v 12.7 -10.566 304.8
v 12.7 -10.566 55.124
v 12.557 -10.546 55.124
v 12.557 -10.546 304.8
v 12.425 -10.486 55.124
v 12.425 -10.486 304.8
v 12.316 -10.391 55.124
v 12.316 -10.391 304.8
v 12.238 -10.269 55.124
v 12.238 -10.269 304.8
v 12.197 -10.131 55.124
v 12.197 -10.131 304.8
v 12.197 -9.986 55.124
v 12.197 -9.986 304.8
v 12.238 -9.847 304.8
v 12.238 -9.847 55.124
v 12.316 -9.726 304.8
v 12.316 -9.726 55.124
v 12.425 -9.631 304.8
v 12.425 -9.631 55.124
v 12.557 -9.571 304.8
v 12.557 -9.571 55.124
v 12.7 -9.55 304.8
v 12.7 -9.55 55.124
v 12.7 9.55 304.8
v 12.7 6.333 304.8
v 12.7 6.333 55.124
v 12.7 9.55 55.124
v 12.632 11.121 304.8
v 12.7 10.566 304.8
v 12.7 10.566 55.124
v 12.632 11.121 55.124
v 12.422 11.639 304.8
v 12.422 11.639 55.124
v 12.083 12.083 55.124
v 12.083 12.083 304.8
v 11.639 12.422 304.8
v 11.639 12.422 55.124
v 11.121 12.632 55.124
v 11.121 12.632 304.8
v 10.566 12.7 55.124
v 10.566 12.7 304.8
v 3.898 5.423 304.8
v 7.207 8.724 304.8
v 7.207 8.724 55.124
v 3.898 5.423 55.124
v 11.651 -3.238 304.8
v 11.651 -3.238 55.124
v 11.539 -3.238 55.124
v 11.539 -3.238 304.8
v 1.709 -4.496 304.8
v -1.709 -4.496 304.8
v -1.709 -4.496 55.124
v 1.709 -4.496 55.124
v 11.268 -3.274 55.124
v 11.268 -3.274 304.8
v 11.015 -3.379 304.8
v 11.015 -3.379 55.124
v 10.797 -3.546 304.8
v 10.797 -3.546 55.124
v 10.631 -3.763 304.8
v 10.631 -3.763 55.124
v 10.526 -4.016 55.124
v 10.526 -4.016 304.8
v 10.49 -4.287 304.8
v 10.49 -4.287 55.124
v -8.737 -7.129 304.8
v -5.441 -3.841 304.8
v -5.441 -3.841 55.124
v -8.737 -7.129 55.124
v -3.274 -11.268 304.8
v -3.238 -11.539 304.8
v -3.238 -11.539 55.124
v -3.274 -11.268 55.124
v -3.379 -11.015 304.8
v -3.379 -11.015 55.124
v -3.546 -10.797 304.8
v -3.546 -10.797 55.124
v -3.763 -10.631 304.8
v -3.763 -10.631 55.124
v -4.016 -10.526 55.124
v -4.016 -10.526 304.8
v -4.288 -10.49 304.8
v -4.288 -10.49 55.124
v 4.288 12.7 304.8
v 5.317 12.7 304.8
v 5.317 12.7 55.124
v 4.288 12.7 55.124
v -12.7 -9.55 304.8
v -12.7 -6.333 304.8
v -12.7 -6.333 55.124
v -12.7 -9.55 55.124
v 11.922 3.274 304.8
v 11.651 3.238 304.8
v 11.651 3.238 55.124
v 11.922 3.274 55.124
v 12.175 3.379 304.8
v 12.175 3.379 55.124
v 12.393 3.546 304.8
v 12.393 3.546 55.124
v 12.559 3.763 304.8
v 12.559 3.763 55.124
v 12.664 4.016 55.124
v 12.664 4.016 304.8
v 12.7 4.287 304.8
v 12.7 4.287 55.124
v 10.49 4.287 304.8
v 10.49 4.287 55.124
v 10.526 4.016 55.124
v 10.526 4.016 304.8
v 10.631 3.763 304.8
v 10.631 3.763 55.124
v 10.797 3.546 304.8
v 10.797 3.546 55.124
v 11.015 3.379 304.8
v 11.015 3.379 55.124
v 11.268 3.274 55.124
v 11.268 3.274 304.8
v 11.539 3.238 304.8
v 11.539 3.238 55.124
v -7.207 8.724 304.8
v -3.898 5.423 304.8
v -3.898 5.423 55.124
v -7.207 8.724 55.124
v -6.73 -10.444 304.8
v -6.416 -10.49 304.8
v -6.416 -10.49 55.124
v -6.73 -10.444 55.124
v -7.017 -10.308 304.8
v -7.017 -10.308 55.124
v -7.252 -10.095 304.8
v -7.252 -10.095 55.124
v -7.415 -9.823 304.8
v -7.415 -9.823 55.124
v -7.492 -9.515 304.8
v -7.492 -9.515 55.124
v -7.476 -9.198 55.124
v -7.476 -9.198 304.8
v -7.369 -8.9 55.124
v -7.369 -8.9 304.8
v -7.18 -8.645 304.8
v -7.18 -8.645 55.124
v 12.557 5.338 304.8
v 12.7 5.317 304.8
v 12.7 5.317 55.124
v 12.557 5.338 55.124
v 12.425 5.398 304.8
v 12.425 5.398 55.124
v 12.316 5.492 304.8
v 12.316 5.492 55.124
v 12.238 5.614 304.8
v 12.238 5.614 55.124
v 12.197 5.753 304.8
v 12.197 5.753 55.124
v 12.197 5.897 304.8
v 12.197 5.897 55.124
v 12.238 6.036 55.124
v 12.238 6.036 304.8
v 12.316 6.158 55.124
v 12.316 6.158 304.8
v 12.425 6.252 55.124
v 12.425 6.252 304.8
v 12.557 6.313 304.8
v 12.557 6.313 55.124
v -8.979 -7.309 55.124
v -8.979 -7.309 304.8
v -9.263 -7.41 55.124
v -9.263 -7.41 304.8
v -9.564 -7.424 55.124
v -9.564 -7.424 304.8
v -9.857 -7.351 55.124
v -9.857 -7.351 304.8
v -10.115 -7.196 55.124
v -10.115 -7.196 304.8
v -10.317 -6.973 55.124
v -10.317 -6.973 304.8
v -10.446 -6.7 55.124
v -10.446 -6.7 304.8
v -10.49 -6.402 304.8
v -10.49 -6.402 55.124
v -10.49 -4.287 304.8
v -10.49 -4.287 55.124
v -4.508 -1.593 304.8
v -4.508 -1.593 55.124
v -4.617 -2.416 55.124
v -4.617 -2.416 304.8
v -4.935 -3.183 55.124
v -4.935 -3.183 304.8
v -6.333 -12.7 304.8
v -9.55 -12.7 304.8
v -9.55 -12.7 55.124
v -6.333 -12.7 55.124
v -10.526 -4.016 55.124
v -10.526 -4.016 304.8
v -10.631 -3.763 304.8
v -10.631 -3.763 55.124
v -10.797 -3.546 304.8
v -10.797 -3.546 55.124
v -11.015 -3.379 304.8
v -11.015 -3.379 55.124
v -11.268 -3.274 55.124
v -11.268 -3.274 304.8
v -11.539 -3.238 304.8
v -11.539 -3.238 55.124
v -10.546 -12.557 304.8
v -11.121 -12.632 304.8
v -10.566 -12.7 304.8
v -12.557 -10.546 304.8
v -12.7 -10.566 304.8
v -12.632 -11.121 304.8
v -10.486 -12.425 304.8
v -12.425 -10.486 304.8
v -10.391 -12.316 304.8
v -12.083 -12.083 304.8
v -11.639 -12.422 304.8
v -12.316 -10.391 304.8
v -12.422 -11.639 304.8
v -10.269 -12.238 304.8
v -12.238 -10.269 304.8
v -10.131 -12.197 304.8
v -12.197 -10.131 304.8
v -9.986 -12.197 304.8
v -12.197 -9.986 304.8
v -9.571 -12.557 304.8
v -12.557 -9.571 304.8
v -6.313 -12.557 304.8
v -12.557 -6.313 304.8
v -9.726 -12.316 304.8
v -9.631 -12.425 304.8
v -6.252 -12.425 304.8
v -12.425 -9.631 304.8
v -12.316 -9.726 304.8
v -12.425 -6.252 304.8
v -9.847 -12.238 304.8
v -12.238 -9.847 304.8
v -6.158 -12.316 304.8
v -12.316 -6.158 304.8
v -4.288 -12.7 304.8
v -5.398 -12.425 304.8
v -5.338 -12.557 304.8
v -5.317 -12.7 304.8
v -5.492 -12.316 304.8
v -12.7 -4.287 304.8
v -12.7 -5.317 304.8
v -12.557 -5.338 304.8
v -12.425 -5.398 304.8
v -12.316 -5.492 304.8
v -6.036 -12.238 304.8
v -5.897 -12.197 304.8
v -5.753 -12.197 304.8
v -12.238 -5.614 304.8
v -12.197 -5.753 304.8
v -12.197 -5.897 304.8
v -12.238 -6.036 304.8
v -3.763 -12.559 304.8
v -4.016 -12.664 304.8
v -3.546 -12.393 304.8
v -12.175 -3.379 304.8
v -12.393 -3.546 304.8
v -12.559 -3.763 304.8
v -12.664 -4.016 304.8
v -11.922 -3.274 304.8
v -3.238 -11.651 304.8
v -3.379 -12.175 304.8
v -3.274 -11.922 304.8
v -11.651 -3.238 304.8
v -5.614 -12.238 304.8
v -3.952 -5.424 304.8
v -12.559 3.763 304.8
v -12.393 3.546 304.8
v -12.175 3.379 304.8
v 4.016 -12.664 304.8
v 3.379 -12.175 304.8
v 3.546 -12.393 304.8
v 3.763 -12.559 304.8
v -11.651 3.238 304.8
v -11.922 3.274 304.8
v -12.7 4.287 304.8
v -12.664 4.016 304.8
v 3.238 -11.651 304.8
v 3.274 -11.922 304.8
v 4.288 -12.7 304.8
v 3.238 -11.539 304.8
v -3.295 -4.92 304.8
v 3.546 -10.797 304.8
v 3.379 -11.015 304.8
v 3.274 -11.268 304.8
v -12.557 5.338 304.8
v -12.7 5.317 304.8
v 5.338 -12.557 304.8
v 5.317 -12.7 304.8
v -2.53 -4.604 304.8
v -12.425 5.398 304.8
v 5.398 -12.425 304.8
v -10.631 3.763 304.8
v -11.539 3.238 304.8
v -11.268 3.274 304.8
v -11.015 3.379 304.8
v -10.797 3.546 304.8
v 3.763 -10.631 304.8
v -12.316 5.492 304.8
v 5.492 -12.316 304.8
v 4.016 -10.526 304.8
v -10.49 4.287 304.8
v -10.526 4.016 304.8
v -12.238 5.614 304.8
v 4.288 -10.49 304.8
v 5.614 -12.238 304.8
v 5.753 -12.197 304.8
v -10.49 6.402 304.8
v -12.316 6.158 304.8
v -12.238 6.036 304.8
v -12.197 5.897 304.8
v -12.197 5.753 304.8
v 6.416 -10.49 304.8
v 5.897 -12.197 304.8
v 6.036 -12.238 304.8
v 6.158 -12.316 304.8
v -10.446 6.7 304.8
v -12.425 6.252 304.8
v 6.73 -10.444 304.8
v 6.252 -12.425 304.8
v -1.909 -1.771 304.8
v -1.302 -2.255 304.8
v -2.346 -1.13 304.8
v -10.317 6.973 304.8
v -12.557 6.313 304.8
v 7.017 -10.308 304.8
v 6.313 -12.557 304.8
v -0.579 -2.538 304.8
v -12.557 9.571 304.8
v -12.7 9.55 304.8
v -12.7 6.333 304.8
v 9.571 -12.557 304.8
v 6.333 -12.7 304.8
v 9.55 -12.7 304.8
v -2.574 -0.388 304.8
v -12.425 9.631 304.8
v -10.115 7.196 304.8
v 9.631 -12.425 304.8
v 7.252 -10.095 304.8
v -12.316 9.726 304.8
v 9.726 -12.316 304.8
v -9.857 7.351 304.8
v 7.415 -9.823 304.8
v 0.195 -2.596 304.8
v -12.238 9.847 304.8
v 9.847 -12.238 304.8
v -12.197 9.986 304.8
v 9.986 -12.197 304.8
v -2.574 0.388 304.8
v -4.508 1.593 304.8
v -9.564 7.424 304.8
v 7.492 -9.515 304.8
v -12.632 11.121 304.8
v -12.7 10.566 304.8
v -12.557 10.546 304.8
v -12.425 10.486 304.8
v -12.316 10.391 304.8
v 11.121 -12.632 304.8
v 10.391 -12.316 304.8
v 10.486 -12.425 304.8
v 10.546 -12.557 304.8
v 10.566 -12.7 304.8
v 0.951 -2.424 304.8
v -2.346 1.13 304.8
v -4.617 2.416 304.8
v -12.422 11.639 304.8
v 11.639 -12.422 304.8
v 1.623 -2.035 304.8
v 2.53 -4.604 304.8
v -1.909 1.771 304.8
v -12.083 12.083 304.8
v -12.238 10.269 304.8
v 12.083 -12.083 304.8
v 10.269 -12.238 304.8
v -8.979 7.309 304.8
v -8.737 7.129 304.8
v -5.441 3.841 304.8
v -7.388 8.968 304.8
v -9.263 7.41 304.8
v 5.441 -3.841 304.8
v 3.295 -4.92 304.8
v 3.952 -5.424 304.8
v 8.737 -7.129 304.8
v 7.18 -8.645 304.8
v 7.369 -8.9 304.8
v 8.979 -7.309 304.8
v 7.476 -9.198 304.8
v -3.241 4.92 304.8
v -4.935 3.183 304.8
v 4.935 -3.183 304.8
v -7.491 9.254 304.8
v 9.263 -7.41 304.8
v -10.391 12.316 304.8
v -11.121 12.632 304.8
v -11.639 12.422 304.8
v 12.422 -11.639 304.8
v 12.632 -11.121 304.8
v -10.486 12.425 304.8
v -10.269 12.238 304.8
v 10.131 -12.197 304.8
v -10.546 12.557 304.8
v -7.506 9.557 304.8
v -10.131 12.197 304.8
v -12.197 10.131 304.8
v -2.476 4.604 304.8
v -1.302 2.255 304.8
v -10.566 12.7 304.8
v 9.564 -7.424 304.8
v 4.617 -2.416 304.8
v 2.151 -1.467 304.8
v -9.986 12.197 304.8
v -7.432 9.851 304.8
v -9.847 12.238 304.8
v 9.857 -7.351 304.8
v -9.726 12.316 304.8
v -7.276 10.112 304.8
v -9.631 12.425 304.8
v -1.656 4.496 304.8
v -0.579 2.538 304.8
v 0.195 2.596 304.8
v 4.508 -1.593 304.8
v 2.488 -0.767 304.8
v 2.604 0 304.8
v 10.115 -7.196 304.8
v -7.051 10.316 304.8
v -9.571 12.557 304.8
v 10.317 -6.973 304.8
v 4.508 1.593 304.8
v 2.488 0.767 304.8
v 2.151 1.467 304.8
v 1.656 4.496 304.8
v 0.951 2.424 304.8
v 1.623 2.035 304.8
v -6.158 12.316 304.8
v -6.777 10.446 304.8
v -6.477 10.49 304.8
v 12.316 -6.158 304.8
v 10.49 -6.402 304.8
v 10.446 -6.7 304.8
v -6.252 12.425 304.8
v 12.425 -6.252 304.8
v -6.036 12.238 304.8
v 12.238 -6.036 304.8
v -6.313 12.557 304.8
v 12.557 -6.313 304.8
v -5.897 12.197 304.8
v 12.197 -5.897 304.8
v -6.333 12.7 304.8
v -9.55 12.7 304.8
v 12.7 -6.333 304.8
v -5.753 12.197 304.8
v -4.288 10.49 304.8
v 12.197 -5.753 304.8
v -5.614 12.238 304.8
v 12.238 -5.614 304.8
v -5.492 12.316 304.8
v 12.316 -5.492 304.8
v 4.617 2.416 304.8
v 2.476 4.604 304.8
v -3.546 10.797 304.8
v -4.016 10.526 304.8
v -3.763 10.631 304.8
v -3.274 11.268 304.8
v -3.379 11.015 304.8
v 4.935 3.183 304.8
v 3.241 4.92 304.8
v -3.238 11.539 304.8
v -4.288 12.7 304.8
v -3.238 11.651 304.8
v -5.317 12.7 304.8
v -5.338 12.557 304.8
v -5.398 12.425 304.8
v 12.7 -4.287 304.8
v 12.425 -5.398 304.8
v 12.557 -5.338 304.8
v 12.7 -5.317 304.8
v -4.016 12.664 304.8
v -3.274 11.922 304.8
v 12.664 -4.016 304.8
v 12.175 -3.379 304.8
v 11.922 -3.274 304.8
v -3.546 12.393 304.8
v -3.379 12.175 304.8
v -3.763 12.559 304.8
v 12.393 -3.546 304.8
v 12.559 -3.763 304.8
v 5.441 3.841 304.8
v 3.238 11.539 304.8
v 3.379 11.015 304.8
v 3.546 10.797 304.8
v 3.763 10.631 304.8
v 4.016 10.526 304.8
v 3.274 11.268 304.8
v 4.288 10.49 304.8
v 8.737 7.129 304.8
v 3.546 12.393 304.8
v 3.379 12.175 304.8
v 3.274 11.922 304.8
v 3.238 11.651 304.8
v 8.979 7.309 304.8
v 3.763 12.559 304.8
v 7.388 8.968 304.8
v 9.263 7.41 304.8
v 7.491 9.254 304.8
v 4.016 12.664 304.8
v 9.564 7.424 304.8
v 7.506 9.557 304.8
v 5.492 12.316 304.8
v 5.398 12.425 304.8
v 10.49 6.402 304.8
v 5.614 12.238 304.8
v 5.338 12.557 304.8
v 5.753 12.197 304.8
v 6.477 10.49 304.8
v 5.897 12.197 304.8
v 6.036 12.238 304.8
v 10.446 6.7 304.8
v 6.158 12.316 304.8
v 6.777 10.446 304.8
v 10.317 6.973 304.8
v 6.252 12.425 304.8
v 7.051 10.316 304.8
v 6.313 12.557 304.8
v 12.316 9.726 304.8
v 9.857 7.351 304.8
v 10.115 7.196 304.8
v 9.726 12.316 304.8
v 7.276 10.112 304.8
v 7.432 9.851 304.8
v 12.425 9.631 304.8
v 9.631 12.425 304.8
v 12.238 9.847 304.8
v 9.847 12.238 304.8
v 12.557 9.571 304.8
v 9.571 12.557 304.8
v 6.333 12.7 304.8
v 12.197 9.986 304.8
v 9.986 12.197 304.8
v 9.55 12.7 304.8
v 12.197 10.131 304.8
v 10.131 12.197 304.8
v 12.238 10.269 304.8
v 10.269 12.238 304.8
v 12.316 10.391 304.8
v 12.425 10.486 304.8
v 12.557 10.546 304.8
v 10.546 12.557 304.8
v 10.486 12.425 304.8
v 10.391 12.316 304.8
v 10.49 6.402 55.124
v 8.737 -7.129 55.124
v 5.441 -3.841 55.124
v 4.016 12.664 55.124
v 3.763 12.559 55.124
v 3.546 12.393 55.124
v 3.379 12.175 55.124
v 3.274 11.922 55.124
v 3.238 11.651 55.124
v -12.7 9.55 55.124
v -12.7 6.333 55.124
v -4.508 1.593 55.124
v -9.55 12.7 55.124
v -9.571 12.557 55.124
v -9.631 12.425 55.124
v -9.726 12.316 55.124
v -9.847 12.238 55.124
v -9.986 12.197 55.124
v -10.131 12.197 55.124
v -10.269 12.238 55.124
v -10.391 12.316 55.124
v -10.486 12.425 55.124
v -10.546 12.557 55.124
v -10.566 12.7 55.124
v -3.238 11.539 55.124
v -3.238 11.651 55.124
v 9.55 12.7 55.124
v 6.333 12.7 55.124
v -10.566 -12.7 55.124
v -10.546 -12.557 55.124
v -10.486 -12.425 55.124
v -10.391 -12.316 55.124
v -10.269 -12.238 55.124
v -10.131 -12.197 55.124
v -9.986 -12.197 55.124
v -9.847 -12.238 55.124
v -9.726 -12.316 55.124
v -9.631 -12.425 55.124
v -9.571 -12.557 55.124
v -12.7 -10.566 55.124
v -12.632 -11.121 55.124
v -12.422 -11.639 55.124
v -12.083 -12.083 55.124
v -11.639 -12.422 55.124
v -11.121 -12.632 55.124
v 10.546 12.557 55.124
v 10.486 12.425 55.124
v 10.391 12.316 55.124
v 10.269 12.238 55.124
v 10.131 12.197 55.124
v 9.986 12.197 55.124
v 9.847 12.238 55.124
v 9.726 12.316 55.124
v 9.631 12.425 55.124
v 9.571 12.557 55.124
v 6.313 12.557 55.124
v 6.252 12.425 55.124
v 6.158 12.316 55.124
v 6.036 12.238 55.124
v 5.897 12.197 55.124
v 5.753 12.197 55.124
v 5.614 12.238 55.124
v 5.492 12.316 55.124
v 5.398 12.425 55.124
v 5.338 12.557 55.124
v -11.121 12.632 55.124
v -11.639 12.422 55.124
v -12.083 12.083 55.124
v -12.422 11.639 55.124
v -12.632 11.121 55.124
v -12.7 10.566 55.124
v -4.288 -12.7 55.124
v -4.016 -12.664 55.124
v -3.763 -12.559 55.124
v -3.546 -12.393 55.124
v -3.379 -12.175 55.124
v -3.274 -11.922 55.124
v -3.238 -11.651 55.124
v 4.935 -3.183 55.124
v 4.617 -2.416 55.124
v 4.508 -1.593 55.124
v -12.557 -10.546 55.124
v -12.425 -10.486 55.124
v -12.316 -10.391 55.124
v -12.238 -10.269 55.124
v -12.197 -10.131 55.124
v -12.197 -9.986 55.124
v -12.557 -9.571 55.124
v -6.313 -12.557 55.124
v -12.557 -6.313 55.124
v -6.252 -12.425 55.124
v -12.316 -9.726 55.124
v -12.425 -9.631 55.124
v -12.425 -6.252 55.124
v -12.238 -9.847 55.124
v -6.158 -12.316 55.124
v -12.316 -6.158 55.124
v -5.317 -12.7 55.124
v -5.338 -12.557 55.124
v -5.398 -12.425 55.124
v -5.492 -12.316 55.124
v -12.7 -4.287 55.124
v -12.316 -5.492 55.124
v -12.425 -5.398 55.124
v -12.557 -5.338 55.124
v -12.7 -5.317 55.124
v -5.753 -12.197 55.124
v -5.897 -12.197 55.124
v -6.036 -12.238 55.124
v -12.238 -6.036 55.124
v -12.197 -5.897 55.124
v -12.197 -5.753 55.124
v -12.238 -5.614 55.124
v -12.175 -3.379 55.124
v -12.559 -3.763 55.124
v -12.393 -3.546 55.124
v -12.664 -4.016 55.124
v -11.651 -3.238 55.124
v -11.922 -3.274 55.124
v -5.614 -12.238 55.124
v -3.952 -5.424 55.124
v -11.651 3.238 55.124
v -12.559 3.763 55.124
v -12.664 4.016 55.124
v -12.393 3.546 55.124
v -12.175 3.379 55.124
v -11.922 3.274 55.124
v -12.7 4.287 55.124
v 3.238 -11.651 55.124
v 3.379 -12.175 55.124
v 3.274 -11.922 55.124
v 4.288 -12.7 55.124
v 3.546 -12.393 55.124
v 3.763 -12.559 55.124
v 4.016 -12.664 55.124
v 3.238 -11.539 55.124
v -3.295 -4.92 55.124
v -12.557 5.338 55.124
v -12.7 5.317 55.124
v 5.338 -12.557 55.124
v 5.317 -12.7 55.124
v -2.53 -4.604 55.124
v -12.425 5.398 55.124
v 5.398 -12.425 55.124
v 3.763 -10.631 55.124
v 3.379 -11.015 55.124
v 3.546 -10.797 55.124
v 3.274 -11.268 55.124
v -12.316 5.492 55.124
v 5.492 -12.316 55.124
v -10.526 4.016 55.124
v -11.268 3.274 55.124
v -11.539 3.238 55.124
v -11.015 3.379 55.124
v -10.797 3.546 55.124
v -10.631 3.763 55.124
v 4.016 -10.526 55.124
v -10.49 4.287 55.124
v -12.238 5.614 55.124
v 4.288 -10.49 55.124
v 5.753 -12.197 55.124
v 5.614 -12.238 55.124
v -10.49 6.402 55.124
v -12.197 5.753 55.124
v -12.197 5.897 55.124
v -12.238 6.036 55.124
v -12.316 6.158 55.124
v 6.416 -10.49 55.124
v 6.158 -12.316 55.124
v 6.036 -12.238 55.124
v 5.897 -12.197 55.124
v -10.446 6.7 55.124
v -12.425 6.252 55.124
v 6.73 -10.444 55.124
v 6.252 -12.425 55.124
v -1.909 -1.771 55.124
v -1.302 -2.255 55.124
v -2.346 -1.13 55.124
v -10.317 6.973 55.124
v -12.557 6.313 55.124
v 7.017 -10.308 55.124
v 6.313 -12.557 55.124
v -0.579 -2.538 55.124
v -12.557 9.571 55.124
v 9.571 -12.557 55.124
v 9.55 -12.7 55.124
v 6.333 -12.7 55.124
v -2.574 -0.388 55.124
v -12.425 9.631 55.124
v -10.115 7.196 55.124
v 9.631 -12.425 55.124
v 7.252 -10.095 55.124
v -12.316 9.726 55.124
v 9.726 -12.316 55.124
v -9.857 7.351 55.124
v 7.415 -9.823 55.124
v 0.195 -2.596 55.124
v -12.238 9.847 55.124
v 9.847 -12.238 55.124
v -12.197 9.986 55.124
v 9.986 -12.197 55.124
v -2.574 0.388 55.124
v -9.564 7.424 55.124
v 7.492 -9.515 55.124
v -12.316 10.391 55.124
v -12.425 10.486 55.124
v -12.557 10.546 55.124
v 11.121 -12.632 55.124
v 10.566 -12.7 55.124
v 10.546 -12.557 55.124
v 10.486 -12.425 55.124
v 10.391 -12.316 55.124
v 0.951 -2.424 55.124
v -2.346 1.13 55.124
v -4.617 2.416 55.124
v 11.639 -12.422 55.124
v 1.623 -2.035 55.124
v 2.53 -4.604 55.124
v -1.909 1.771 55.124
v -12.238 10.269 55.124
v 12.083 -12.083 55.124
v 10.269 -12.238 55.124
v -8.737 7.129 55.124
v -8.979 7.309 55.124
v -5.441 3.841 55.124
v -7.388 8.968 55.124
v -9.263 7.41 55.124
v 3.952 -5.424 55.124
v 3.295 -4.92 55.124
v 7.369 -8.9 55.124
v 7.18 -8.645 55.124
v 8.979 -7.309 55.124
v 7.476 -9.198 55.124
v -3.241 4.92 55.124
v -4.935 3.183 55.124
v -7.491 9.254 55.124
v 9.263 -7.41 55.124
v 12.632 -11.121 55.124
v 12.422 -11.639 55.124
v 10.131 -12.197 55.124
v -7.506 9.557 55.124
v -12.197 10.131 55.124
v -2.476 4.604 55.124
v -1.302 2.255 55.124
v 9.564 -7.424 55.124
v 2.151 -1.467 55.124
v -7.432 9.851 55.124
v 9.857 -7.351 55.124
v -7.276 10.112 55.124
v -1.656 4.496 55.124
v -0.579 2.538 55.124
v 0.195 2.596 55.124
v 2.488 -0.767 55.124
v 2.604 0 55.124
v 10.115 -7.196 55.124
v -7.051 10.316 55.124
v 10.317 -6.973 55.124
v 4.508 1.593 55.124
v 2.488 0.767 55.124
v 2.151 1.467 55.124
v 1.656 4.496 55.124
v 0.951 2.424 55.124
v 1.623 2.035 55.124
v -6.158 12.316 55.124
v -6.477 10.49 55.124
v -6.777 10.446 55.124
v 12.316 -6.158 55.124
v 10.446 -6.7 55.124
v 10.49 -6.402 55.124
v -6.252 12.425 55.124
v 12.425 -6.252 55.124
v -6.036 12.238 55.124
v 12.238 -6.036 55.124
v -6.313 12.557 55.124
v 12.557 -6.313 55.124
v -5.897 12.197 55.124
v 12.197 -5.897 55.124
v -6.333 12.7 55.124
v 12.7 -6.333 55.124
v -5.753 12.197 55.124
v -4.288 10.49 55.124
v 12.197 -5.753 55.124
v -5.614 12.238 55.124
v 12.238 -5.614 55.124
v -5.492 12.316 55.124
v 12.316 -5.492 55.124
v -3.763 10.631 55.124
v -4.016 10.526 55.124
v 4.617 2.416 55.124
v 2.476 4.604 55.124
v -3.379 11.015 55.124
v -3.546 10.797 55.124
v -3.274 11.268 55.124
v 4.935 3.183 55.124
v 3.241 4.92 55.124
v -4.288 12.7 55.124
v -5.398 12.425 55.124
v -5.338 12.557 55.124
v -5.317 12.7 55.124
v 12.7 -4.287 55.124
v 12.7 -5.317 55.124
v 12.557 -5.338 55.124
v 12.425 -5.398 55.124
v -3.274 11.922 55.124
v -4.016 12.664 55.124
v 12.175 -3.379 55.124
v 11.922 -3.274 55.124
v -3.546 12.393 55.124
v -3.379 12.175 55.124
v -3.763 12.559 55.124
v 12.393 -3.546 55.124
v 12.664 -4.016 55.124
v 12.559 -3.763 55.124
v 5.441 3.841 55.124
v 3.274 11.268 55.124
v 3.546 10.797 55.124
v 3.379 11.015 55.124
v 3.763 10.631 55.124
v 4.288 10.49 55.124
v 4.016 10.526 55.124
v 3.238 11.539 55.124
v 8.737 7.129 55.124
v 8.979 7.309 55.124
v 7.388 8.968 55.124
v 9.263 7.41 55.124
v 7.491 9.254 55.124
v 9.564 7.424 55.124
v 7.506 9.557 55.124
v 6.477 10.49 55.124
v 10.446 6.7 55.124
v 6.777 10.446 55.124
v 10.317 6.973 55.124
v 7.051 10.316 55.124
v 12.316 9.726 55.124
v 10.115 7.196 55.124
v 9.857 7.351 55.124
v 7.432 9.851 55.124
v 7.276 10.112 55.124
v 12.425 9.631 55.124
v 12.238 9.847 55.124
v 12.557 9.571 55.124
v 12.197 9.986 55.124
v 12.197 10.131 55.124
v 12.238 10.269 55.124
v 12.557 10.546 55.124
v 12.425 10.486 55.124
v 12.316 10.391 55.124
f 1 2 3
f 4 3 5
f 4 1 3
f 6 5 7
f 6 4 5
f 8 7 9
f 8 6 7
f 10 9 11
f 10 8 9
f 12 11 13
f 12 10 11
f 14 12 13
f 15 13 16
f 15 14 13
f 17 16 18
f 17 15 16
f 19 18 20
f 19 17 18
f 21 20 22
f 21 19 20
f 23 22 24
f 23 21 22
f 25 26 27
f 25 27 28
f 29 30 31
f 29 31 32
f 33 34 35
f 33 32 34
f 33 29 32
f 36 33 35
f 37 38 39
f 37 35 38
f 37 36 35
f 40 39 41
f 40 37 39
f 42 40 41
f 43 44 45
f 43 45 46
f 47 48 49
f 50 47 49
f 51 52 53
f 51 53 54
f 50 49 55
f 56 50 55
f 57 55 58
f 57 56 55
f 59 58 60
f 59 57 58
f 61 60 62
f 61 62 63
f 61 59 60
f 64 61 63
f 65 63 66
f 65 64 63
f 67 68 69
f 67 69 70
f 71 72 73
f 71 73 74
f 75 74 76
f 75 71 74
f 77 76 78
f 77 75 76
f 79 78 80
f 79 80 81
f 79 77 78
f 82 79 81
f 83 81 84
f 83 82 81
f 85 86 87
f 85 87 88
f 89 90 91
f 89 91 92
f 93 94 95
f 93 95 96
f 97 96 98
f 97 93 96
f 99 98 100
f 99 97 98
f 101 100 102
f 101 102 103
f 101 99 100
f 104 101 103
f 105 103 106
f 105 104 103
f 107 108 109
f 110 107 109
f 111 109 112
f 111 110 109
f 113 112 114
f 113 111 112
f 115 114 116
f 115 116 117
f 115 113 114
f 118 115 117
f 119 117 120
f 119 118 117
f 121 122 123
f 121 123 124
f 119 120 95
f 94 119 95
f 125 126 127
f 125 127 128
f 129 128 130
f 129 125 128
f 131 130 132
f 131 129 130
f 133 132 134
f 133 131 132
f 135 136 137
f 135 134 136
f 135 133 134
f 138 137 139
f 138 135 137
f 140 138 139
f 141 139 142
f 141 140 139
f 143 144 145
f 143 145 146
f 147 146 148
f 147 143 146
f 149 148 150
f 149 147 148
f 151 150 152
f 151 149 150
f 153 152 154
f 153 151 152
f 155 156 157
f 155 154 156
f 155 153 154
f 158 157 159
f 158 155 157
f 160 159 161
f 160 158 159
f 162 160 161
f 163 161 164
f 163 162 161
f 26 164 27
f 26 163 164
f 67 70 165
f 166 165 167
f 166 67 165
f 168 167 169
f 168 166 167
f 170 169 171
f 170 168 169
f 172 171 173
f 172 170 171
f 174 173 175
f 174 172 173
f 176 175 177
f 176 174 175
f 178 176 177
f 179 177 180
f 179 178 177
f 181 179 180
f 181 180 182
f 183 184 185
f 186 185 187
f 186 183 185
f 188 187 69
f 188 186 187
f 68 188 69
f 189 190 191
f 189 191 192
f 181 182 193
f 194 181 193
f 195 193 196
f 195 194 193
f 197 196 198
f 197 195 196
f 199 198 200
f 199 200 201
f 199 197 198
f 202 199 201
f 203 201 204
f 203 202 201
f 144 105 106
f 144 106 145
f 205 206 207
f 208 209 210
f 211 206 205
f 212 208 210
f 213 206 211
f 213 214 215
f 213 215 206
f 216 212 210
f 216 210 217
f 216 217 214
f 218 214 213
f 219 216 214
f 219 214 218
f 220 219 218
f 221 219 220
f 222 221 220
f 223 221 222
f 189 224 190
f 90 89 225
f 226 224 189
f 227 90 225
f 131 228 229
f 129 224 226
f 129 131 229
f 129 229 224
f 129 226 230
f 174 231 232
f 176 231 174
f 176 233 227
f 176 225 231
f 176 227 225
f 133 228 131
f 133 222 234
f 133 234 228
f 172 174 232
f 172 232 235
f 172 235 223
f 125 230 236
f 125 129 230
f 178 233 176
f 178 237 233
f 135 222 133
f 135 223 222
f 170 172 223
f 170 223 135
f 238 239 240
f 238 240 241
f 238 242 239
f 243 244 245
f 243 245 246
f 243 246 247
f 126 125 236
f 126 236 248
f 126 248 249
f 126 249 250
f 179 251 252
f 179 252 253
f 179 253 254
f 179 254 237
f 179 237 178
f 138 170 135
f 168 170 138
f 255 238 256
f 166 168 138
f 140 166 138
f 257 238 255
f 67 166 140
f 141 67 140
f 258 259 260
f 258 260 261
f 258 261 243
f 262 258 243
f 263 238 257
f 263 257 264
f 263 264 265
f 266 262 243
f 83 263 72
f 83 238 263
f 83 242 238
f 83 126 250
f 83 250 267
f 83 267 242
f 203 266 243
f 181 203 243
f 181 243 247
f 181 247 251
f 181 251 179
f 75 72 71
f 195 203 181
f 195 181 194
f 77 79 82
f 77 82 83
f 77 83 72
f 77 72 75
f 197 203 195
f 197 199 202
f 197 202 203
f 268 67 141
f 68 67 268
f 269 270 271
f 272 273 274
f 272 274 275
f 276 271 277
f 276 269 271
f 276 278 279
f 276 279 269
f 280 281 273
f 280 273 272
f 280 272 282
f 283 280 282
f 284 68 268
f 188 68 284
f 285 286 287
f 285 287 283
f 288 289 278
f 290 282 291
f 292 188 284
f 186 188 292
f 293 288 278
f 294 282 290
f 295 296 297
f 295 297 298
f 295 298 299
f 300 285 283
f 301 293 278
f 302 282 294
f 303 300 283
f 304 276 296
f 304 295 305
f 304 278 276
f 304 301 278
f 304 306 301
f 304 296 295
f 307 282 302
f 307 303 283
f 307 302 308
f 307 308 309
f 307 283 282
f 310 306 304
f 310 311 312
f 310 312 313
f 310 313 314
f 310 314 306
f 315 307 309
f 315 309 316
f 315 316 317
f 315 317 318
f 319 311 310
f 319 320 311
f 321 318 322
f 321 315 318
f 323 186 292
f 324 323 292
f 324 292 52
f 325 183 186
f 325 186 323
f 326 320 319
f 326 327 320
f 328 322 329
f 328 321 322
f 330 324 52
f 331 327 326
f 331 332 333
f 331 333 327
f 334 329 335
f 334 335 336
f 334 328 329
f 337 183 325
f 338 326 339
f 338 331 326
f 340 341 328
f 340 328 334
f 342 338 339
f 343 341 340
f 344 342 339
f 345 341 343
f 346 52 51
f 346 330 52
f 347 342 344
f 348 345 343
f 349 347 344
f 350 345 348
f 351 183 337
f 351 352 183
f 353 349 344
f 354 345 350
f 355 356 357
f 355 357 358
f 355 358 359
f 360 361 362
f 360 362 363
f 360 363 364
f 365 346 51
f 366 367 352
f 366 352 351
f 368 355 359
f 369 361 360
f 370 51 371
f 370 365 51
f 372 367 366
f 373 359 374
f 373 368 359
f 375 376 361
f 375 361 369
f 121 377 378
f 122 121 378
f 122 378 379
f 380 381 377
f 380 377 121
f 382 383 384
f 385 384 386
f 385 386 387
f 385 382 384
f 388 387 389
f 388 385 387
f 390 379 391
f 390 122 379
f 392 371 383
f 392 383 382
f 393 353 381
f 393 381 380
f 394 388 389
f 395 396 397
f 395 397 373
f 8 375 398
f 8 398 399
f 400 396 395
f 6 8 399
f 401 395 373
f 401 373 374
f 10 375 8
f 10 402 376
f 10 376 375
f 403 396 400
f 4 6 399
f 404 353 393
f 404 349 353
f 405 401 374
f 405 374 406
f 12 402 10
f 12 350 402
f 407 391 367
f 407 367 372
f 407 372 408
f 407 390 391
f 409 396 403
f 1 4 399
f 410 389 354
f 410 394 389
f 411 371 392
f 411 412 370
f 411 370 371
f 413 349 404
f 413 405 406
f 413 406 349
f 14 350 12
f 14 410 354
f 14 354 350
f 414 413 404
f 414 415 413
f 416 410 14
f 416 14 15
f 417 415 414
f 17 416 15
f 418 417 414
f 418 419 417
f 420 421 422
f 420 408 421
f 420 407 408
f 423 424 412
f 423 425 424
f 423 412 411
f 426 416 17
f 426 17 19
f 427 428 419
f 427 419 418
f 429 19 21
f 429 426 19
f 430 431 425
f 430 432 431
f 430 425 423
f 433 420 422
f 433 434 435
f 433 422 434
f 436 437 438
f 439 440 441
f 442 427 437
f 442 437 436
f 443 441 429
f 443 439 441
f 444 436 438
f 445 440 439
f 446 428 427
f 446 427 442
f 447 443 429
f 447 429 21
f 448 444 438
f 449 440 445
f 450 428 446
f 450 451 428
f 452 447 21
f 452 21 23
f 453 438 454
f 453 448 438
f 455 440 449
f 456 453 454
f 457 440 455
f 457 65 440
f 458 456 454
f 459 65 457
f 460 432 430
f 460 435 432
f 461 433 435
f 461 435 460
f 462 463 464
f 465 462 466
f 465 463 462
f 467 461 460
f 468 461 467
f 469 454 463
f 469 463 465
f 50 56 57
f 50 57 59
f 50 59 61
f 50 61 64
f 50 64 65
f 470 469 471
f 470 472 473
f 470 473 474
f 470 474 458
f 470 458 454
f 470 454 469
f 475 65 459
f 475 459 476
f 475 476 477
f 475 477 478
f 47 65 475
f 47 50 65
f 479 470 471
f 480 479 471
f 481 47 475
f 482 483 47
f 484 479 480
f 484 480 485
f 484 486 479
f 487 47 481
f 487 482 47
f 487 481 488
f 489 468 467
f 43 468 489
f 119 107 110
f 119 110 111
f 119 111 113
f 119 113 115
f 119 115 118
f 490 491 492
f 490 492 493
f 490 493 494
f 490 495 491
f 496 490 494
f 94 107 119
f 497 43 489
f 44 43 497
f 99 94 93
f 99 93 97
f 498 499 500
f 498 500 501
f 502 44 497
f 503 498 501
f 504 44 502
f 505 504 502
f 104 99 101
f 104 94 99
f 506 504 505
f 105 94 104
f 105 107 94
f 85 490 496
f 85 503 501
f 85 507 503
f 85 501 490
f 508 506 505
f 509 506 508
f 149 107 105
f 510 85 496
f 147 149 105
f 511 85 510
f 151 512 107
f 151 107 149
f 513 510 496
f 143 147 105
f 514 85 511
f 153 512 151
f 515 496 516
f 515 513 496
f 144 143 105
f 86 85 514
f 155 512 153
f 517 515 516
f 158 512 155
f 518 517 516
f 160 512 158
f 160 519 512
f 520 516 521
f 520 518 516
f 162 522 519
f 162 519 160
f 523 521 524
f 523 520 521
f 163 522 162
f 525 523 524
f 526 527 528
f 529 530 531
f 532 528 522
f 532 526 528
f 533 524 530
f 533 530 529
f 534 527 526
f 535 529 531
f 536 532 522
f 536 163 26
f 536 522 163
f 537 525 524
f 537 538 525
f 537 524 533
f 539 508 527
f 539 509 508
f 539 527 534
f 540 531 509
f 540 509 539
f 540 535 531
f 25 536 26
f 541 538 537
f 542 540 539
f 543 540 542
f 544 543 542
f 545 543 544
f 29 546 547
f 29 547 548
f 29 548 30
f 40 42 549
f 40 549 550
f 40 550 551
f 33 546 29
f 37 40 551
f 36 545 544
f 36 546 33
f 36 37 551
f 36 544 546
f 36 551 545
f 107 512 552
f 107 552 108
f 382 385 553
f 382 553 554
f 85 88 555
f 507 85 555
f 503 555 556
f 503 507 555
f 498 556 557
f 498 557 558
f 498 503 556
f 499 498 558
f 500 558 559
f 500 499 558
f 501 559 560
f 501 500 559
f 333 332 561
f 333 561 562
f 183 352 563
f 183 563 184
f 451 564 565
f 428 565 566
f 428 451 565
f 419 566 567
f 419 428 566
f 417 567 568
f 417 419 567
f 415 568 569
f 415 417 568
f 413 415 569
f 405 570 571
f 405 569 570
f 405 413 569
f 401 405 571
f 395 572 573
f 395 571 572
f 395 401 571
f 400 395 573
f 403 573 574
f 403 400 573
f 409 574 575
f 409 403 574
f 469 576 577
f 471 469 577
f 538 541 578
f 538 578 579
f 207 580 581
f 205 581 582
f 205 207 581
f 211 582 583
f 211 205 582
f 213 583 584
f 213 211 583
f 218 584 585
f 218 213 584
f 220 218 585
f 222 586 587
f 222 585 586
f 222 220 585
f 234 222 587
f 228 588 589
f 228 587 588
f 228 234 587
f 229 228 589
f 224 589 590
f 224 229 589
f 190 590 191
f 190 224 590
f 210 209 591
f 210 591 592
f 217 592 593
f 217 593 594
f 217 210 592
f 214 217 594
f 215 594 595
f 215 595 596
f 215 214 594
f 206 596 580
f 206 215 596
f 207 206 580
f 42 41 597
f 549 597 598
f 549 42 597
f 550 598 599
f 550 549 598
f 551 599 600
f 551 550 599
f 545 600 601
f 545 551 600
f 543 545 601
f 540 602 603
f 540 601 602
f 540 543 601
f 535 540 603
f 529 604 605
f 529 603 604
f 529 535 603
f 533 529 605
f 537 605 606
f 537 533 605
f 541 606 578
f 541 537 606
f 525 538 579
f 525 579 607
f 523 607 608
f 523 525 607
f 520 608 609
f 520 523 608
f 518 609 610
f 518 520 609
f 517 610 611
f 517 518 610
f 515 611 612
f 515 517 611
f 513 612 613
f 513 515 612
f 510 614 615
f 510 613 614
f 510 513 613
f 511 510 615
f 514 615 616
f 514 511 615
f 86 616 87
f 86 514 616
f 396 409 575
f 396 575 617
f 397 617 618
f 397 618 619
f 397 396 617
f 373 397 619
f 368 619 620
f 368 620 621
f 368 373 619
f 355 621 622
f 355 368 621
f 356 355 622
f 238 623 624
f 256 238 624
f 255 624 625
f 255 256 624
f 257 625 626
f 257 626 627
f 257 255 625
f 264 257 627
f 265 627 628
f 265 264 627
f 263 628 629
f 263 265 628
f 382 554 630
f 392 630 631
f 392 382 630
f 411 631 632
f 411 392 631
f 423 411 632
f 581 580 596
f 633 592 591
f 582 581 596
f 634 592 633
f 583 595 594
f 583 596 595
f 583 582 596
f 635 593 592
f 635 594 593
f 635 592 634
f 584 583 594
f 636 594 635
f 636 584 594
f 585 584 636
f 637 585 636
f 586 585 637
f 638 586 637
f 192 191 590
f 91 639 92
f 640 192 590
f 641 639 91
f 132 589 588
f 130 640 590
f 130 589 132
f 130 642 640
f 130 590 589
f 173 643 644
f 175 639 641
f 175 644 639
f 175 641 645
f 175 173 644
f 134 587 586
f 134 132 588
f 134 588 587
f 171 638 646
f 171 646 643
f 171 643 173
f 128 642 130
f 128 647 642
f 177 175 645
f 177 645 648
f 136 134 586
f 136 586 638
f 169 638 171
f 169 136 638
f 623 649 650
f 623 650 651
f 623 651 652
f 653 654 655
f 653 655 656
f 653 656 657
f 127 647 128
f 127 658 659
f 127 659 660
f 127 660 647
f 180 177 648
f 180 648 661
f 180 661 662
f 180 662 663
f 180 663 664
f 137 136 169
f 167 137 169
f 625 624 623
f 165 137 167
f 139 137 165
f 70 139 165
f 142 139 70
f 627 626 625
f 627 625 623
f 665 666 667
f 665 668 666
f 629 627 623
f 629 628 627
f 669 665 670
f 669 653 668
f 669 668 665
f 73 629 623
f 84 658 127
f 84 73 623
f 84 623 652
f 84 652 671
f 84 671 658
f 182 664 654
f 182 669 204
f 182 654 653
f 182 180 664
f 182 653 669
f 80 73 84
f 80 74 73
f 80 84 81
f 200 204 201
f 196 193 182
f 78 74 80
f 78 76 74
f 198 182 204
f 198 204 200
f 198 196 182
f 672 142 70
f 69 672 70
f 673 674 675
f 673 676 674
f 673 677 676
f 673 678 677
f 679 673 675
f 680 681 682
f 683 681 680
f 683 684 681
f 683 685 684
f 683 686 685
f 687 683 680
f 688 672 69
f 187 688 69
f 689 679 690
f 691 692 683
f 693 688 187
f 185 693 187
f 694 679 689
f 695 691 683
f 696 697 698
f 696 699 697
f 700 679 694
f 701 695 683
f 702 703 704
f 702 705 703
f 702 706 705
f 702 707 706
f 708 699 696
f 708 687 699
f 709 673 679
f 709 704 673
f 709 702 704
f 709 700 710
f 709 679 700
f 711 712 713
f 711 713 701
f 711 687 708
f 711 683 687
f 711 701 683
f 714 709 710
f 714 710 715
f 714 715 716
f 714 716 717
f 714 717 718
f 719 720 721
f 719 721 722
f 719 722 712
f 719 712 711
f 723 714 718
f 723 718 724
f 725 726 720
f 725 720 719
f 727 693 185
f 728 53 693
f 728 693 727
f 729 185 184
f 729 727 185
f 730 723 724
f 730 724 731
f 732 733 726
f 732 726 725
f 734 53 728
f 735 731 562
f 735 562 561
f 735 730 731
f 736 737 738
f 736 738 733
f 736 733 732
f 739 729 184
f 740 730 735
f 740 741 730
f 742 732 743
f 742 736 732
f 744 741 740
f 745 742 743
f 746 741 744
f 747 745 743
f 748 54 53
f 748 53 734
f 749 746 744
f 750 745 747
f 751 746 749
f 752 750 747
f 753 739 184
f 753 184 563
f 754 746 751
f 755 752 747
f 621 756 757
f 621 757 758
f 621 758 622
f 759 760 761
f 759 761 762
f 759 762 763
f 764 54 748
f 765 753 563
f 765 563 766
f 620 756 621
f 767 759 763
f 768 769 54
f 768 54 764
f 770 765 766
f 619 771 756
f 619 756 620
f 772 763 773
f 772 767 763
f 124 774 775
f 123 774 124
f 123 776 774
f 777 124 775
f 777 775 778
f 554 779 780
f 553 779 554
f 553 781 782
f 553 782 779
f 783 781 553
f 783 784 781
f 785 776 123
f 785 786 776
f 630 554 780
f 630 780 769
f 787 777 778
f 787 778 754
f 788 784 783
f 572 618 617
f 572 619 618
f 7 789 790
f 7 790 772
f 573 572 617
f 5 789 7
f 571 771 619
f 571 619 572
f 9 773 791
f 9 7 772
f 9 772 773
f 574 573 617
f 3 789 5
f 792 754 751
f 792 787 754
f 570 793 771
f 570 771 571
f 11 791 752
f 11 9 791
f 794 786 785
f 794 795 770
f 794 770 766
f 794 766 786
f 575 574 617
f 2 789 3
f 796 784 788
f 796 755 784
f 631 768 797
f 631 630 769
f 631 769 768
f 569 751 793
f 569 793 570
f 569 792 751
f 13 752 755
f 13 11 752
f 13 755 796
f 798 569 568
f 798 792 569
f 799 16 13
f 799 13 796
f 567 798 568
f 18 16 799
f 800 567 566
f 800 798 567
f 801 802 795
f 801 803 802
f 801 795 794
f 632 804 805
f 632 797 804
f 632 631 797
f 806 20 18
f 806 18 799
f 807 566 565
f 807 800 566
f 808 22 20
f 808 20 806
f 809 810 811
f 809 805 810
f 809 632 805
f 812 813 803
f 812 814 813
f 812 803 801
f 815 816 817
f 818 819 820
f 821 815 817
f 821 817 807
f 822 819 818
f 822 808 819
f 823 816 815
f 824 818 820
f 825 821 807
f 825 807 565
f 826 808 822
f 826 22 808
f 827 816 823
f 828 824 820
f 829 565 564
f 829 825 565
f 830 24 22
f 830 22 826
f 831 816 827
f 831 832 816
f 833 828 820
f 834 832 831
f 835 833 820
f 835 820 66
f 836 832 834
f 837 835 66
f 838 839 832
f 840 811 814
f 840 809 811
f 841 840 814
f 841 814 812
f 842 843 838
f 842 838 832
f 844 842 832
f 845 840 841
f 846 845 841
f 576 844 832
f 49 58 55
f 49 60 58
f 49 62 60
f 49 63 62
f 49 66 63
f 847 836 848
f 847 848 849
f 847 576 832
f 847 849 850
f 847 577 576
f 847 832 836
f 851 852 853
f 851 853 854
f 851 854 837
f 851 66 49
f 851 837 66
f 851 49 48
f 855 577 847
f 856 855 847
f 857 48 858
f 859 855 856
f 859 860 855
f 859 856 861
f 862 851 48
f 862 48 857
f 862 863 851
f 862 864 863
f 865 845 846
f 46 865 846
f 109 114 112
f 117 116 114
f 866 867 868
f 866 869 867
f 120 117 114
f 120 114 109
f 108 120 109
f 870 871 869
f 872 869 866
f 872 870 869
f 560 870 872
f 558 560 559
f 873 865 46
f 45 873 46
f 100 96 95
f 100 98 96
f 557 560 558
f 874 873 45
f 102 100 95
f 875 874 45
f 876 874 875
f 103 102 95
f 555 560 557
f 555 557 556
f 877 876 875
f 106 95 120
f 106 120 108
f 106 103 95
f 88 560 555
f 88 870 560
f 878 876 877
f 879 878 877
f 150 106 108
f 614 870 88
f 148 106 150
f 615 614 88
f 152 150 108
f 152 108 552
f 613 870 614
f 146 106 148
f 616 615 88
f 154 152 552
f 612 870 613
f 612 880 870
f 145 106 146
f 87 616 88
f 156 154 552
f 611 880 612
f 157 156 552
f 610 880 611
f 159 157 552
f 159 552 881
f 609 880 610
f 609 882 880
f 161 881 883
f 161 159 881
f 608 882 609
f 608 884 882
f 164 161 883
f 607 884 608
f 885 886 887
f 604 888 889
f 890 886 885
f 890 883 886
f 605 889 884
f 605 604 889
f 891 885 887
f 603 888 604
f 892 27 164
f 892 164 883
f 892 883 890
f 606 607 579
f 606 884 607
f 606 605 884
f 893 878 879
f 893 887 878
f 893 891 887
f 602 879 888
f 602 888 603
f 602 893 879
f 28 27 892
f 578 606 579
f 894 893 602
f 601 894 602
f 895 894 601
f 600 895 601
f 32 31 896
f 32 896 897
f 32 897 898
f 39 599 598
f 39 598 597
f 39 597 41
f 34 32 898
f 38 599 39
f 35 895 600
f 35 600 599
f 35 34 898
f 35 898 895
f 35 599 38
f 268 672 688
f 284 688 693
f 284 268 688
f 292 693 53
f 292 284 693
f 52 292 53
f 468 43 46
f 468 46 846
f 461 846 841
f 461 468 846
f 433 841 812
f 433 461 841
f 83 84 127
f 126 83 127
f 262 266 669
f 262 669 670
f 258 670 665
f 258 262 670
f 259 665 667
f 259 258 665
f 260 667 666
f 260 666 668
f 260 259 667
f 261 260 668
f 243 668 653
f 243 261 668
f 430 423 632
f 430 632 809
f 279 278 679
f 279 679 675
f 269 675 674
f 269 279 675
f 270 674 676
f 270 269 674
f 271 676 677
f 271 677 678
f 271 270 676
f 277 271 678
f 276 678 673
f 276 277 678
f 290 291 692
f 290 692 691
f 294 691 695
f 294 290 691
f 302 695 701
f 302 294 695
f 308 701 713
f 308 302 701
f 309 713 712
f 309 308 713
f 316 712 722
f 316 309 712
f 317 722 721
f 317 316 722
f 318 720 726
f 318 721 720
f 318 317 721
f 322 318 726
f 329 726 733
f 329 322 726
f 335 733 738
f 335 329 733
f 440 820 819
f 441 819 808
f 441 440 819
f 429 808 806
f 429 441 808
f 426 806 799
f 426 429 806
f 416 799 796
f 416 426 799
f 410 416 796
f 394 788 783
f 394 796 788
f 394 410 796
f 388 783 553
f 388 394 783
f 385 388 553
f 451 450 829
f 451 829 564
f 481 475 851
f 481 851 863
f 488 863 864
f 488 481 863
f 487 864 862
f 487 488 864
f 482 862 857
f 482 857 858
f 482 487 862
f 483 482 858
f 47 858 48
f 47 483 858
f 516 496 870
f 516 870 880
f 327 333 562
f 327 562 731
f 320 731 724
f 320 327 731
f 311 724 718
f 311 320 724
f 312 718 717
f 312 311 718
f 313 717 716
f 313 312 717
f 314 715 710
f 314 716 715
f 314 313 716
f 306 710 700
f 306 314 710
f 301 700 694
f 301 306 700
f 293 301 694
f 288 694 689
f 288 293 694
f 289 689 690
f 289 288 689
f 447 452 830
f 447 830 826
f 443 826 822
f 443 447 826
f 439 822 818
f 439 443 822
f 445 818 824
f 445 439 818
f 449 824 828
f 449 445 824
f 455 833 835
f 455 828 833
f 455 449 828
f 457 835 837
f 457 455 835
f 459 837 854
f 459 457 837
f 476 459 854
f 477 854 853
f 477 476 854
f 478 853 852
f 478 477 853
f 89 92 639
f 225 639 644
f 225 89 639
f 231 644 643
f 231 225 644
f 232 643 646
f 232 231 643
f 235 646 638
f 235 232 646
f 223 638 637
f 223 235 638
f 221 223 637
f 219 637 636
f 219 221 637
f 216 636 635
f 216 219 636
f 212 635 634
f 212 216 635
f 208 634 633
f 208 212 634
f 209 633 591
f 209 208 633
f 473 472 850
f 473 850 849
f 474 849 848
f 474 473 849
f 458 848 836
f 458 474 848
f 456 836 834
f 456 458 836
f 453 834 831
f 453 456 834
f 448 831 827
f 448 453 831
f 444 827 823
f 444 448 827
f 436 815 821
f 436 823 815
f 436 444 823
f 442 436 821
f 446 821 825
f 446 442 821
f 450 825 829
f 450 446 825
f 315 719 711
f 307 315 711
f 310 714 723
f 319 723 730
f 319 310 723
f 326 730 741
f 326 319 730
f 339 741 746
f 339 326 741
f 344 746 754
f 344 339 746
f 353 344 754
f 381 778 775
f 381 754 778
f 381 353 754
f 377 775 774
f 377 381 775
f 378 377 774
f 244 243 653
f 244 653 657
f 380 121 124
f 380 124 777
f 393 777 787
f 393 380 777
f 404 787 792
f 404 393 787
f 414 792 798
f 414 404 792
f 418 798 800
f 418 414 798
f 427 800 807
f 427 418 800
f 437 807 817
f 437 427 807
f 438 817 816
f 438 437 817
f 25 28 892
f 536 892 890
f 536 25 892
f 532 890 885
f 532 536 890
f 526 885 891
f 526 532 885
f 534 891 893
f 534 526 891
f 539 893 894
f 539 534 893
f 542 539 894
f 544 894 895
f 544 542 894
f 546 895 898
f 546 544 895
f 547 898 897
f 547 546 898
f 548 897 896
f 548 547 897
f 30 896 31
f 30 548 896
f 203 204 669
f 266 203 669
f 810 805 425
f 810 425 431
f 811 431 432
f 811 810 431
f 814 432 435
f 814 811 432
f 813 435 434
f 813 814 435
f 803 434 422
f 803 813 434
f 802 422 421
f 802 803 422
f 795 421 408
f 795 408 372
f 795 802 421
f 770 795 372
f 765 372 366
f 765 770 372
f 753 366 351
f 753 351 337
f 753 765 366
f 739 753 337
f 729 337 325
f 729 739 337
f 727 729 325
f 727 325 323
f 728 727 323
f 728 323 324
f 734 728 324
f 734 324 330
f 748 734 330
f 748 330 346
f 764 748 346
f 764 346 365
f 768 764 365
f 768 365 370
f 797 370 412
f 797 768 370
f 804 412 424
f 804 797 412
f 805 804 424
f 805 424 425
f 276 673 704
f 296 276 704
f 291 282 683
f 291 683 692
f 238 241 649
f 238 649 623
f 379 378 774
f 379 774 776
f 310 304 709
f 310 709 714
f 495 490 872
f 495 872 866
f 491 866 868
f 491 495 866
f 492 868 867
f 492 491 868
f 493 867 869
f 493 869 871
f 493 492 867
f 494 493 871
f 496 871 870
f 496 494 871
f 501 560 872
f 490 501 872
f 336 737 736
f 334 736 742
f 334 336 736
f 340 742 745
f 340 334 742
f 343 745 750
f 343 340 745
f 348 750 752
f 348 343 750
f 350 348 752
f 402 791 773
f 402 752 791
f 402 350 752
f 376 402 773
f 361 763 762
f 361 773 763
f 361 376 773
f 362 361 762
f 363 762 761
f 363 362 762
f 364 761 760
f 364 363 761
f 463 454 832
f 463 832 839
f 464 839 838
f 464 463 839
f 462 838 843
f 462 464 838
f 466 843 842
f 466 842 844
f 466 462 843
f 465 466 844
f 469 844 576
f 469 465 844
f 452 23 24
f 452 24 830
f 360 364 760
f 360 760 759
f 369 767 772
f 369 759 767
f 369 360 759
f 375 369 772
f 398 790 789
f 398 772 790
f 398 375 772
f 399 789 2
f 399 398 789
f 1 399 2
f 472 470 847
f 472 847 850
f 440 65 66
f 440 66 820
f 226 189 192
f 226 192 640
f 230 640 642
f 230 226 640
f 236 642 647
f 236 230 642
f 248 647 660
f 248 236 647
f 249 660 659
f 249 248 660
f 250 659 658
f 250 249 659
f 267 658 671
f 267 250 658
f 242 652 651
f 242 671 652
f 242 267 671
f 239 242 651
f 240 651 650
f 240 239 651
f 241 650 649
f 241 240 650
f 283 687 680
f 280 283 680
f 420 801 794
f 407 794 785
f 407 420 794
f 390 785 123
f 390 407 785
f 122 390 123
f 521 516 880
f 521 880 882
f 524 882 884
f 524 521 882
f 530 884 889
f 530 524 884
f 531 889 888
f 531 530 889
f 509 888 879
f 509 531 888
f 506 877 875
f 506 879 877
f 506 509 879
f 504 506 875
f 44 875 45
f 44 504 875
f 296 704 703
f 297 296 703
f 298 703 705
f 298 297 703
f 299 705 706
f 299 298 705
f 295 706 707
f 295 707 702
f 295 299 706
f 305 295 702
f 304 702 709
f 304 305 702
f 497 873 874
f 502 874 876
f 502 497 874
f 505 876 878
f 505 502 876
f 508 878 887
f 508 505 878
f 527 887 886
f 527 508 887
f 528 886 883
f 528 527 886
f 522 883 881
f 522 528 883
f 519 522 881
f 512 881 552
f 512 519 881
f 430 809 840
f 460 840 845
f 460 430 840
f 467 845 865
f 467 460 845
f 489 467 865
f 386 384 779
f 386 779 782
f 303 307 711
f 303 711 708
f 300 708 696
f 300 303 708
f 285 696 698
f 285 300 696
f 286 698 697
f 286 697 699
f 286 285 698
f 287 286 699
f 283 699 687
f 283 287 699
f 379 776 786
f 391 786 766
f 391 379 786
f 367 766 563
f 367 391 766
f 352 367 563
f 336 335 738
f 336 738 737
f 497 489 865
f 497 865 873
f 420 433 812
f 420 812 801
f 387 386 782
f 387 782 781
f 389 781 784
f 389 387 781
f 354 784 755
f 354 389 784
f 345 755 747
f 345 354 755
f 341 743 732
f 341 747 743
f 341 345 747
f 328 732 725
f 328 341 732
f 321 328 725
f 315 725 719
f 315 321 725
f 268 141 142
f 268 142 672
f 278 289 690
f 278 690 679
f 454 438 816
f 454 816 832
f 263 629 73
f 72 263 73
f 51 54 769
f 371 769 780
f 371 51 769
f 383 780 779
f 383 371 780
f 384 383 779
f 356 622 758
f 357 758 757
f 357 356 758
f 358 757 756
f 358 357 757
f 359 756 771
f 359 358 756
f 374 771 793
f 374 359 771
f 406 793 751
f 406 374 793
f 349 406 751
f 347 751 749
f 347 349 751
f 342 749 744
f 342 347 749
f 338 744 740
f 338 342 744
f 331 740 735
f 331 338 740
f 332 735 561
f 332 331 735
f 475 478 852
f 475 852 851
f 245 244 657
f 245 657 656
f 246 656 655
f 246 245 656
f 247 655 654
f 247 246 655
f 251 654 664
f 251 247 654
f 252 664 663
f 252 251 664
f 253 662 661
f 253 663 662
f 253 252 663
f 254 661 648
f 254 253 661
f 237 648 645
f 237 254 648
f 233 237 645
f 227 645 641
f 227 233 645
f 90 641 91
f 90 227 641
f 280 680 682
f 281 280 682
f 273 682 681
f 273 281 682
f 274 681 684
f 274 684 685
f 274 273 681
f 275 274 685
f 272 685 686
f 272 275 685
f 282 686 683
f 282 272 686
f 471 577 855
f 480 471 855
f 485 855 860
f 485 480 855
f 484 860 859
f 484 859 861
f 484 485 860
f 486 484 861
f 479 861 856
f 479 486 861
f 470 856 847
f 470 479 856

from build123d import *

# Parameters (mm, degrees)
SKETCH1_R               = 2.6035
BOSS_EXTRUDE1_DEPTH     = 304.8
SKETCH2_W               = 362.658607085
SKETCH2_H               = 27.642551573
CUT_EXTRUDE1_DEPTH      = 7.112
CUT_EXTRUDE1_DEPTH_BACK = 30.734


with BuildPart() as part:
    # Sketch1 → Boss-Extrude1 (new body, symmetric)
    with BuildSketch(Plane.XY):
        with BuildLine():
            Line((-7.179650497, -8.645192506), (-3.952270251, -5.423690499))
            ThreePointArc((-3.952270251, -5.423690499), (-2.922936451, -4.736929036), (-1.709253557, -4.4958))
            Line((-1.709253557, -4.4958), (1.709253557, -4.4958))
            ThreePointArc((1.709253557, -4.4958), (2.922936451, -4.736929036), (3.952270251, -5.423690499))
            Line((3.952270251, -5.423690499), (7.179650497, -8.645192506))
            ThreePointArc((7.179650497, -8.645192506), (7.41473083, -9.822813117), (6.416408329, -10.4902))
            Line((6.416408329, -10.4902), (4.287512407, -10.4902))
            ThreePointArc((4.287512407, -10.4902), (3.54574862, -10.79744862), (3.2385, -11.539212407))
            Line((3.2385, -11.539212407), (3.2385, -11.650987593))
            ThreePointArc((3.2385, -11.650987593), (3.54574862, -12.39275138), (4.287512407, -12.7))
            Line((4.287512407, -12.7), (5.317126718, -12.7))
            ThreePointArc((5.317126718, -12.7), (5.825126718, -12.192), (6.333126718, -12.7))
            Line((6.333126718, -12.7), (9.550443118, -12.7))
            ThreePointArc((9.550443118, -12.7), (10.058366869, -12.192000006), (10.566443095, -12.699847501))
            ThreePointArc((10.566443095, -12.699847501), (12.082537762, -12.08250727), (12.699846982, -10.566399977))
            ThreePointArc((12.699846982, -10.566399977), (12.192000006, -10.058323491), (12.7, -9.5504))
            Line((12.7, -9.5504), (12.7, -6.3330836))
            ThreePointArc((12.7, -6.3330836), (12.192, -5.8250836), (12.7, -5.3170836))
            Line((12.7, -5.3170836), (12.7, -4.287469289))
            ThreePointArc((12.7, -4.287469289), (12.39275138, -3.545705502), (11.650987593, -3.238456882))
            Line((11.650987593, -3.238456882), (11.539212407, -3.238456882))
            ThreePointArc((11.539212407, -3.238456882), (10.79744862, -3.545705502), (10.4902, -4.287469289))
            Line((10.4902, -4.287469289), (10.4902, -6.402089023))
            ThreePointArc((10.4902, -6.402089023), (9.856505071, -7.351067942), (8.737131347, -7.129408934))
            Line((8.737131347, -7.129408934), (5.441005833, -3.840816462))
            ThreePointArc((5.441005833, -3.840816462), (4.750877967, -2.809883091), (4.5085, -1.593185507))
            Line((4.5085, -1.593185507), (4.5085, 1.593185507))
            ThreePointArc((4.5085, 1.593185507), (4.750877967, 2.809883091), (5.441005833, 3.840816462))
            Line((5.441005833, 3.840816462), (8.737131347, 7.129408934))
            ThreePointArc((8.737131347, 7.129408934), (9.856505071, 7.351067942), (10.4902, 6.402089023))
            Line((10.4902, 6.402089023), (10.4902, 4.287469289))
            ThreePointArc((10.4902, 4.287469289), (10.79744862, 3.545705502), (11.539212407, 3.238456882))
            Line((11.539212407, 3.238456882), (11.650987593, 3.238456882))
            ThreePointArc((11.650987593, 3.238456882), (12.39275138, 3.545705502), (12.7, 4.287469289))
            Line((12.7, 4.287469289), (12.7, 5.3170836))
            ThreePointArc((12.7, 5.3170836), (12.192, 5.8250836), (12.7, 6.3330836))
            Line((12.7, 6.3330836), (12.7, 9.5504))
            ThreePointArc((12.7, 9.5504), (12.192000006, 10.058323491), (12.699846982, 10.566399977))
            ThreePointArc((12.699846982, 10.566399977), (12.082537762, 12.08250727), (10.566443095, 12.699847501))
            ThreePointArc((10.566443095, 12.699847501), (10.058366869, 12.192000006), (9.550443118, 12.7))
            Line((9.550443118, 12.7), (6.333126718, 12.7))
            ThreePointArc((6.333126718, 12.7), (5.825126718, 12.192), (5.317126718, 12.7))
            Line((5.317126718, 12.7), (4.287512407, 12.7))
            ThreePointArc((4.287512407, 12.7), (3.54574862, 12.39275138), (3.2385, 11.650987593))
            Line((3.2385, 11.650987593), (3.2385, 11.539212407))
            ThreePointArc((3.2385, 11.539212407), (3.54574862, 10.79744862), (4.287512407, 10.4902))
            Line((4.287512407, 10.4902), (6.476788598, 10.4902))
            ThreePointArc((6.476788598, 10.4902), (7.432222385, 9.85140422), (7.207036008, 8.724370562))
            Line((7.207036008, 8.724370562), (3.898272566, 5.423169045))
            ThreePointArc((3.898272566, 5.423169045), (2.869120213, 4.736787962), (1.655778399, 4.4958))
            Line((1.655778399, 4.4958), (-1.655778399, 4.4958))
            ThreePointArc((-1.655778399, 4.4958), (-2.869120213, 4.736787962), (-3.898272566, 5.423169045))
            Line((-3.898272566, 5.423169045), (-7.207036008, 8.724370562))
            ThreePointArc((-7.207036008, 8.724370562), (-7.432222385, 9.85140422), (-6.476788598, 10.4902))
            Line((-6.476788598, 10.4902), (-4.287512407, 10.4902))
            ThreePointArc((-4.287512407, 10.4902), (-3.54574862, 10.79744862), (-3.2385, 11.539212407))
            Line((-3.2385, 11.539212407), (-3.2385, 11.650987593))
            ThreePointArc((-3.2385, 11.650987593), (-3.54574862, 12.39275138), (-4.287512407, 12.7))
            Line((-4.287512407, 12.7), (-5.317126718, 12.7))
            ThreePointArc((-5.317126718, 12.7), (-5.825126718, 12.192), (-6.333126718, 12.7))
            Line((-6.333126718, 12.7), (-9.550443118, 12.7))
            ThreePointArc((-9.550443118, 12.7), (-10.058366869, 12.192000006), (-10.566443095, 12.699847501))
            ThreePointArc((-10.566443095, 12.699847501), (-12.082537762, 12.08250727), (-12.699846982, 10.566399977))
            ThreePointArc((-12.699846982, 10.566399977), (-12.192000006, 10.058323491), (-12.7, 9.5504))
            Line((-12.7, 9.5504), (-12.7, 6.3330836))
            ThreePointArc((-12.7, 6.3330836), (-12.192, 5.8250836), (-12.7, 5.3170836))
            Line((-12.7, 5.3170836), (-12.7, 4.287469289))
            ThreePointArc((-12.7, 4.287469289), (-12.39275138, 3.545705502), (-11.650987593, 3.238456882))
            Line((-11.650987593, 3.238456882), (-11.539212407, 3.238456882))
            ThreePointArc((-11.539212407, 3.238456882), (-10.79744862, 3.545705502), (-10.4902, 4.287469289))
            Line((-10.4902, 4.287469289), (-10.4902, 6.402089023))
            ThreePointArc((-10.4902, 6.402089023), (-9.856505071, 7.351067942), (-8.737131347, 7.129408934))
            Line((-8.737131347, 7.129408934), (-5.441005833, 3.840816462))
            ThreePointArc((-5.441005833, 3.840816462), (-4.750877967, 2.809883091), (-4.5085, 1.593185507))
            Line((-4.5085, 1.593185507), (-4.5085, -1.593185507))
            ThreePointArc((-4.5085, -1.593185507), (-4.750877967, -2.809883091), (-5.441005833, -3.840816462))
            Line((-5.441005833, -3.840816462), (-8.737131347, -7.129408934))
            ThreePointArc((-8.737131347, -7.129408934), (-9.856505071, -7.351067942), (-10.4902, -6.402089023))
            Line((-10.4902, -6.402089023), (-10.4902, -4.287469289))
            ThreePointArc((-10.4902, -4.287469289), (-10.79744862, -3.545705502), (-11.539212407, -3.238456882))
            Line((-11.539212407, -3.238456882), (-11.650987593, -3.238456882))
            ThreePointArc((-11.650987593, -3.238456882), (-12.39275138, -3.545705502), (-12.7, -4.287469289))
            Line((-12.7, -4.287469289), (-12.7, -5.3170836))
            ThreePointArc((-12.7, -5.3170836), (-12.192, -5.8250836), (-12.7, -6.3330836))
            Line((-12.7, -6.3330836), (-12.7, -9.5504))
            ThreePointArc((-12.7, -9.5504), (-12.192000006, -10.058323491), (-12.699846982, -10.566399977))
            ThreePointArc((-12.699846982, -10.566399977), (-12.082537762, -12.08250727), (-10.566443095, -12.699847501))
            ThreePointArc((-10.566443095, -12.699847501), (-10.058366869, -12.192000006), (-9.550443118, -12.7))
            Line((-9.550443118, -12.7), (-6.333126718, -12.7))
            ThreePointArc((-6.333126718, -12.7), (-5.825126718, -12.192), (-5.317126718, -12.7))
            Line((-5.317126718, -12.7), (-4.287512407, -12.7))
            ThreePointArc((-4.287512407, -12.7), (-3.54574862, -12.39275138), (-3.2385, -11.650987593))
            Line((-3.2385, -11.650987593), (-3.2385, -11.539212407))
            ThreePointArc((-3.2385, -11.539212407), (-3.54574862, -10.79744862), (-4.287512407, -10.4902))
            Line((-4.287512407, -10.4902), (-6.416408329, -10.4902))
            ThreePointArc((-6.416408329, -10.4902), (-7.41473083, -9.822813117), (-7.179650497, -8.645192506))
        make_face()
        Circle(SKETCH1_R, mode=Mode.SUBTRACT)
    extrude(amount=BOSS_EXTRUDE1_DEPTH, both=True)

    # Sketch2 → Cut-Extrude1 (cut, two sides)
    with BuildSketch(Plane(origin=(12.7, 0, 0), x_dir=(0, 0, -1), z_dir=(1, 0, 0))) as cut_extrude1_sk:
        with Locations((126.205743533, -0.275832689)):
            Rectangle(SKETCH2_W, SKETCH2_H)
    extrude(amount=CUT_EXTRUDE1_DEPTH, mode=Mode.SUBTRACT)
    extrude(cut_extrude1_sk.sketch, amount=-CUT_EXTRUDE1_DEPTH_BACK, mode=Mode.SUBTRACT)


solid = part.part
